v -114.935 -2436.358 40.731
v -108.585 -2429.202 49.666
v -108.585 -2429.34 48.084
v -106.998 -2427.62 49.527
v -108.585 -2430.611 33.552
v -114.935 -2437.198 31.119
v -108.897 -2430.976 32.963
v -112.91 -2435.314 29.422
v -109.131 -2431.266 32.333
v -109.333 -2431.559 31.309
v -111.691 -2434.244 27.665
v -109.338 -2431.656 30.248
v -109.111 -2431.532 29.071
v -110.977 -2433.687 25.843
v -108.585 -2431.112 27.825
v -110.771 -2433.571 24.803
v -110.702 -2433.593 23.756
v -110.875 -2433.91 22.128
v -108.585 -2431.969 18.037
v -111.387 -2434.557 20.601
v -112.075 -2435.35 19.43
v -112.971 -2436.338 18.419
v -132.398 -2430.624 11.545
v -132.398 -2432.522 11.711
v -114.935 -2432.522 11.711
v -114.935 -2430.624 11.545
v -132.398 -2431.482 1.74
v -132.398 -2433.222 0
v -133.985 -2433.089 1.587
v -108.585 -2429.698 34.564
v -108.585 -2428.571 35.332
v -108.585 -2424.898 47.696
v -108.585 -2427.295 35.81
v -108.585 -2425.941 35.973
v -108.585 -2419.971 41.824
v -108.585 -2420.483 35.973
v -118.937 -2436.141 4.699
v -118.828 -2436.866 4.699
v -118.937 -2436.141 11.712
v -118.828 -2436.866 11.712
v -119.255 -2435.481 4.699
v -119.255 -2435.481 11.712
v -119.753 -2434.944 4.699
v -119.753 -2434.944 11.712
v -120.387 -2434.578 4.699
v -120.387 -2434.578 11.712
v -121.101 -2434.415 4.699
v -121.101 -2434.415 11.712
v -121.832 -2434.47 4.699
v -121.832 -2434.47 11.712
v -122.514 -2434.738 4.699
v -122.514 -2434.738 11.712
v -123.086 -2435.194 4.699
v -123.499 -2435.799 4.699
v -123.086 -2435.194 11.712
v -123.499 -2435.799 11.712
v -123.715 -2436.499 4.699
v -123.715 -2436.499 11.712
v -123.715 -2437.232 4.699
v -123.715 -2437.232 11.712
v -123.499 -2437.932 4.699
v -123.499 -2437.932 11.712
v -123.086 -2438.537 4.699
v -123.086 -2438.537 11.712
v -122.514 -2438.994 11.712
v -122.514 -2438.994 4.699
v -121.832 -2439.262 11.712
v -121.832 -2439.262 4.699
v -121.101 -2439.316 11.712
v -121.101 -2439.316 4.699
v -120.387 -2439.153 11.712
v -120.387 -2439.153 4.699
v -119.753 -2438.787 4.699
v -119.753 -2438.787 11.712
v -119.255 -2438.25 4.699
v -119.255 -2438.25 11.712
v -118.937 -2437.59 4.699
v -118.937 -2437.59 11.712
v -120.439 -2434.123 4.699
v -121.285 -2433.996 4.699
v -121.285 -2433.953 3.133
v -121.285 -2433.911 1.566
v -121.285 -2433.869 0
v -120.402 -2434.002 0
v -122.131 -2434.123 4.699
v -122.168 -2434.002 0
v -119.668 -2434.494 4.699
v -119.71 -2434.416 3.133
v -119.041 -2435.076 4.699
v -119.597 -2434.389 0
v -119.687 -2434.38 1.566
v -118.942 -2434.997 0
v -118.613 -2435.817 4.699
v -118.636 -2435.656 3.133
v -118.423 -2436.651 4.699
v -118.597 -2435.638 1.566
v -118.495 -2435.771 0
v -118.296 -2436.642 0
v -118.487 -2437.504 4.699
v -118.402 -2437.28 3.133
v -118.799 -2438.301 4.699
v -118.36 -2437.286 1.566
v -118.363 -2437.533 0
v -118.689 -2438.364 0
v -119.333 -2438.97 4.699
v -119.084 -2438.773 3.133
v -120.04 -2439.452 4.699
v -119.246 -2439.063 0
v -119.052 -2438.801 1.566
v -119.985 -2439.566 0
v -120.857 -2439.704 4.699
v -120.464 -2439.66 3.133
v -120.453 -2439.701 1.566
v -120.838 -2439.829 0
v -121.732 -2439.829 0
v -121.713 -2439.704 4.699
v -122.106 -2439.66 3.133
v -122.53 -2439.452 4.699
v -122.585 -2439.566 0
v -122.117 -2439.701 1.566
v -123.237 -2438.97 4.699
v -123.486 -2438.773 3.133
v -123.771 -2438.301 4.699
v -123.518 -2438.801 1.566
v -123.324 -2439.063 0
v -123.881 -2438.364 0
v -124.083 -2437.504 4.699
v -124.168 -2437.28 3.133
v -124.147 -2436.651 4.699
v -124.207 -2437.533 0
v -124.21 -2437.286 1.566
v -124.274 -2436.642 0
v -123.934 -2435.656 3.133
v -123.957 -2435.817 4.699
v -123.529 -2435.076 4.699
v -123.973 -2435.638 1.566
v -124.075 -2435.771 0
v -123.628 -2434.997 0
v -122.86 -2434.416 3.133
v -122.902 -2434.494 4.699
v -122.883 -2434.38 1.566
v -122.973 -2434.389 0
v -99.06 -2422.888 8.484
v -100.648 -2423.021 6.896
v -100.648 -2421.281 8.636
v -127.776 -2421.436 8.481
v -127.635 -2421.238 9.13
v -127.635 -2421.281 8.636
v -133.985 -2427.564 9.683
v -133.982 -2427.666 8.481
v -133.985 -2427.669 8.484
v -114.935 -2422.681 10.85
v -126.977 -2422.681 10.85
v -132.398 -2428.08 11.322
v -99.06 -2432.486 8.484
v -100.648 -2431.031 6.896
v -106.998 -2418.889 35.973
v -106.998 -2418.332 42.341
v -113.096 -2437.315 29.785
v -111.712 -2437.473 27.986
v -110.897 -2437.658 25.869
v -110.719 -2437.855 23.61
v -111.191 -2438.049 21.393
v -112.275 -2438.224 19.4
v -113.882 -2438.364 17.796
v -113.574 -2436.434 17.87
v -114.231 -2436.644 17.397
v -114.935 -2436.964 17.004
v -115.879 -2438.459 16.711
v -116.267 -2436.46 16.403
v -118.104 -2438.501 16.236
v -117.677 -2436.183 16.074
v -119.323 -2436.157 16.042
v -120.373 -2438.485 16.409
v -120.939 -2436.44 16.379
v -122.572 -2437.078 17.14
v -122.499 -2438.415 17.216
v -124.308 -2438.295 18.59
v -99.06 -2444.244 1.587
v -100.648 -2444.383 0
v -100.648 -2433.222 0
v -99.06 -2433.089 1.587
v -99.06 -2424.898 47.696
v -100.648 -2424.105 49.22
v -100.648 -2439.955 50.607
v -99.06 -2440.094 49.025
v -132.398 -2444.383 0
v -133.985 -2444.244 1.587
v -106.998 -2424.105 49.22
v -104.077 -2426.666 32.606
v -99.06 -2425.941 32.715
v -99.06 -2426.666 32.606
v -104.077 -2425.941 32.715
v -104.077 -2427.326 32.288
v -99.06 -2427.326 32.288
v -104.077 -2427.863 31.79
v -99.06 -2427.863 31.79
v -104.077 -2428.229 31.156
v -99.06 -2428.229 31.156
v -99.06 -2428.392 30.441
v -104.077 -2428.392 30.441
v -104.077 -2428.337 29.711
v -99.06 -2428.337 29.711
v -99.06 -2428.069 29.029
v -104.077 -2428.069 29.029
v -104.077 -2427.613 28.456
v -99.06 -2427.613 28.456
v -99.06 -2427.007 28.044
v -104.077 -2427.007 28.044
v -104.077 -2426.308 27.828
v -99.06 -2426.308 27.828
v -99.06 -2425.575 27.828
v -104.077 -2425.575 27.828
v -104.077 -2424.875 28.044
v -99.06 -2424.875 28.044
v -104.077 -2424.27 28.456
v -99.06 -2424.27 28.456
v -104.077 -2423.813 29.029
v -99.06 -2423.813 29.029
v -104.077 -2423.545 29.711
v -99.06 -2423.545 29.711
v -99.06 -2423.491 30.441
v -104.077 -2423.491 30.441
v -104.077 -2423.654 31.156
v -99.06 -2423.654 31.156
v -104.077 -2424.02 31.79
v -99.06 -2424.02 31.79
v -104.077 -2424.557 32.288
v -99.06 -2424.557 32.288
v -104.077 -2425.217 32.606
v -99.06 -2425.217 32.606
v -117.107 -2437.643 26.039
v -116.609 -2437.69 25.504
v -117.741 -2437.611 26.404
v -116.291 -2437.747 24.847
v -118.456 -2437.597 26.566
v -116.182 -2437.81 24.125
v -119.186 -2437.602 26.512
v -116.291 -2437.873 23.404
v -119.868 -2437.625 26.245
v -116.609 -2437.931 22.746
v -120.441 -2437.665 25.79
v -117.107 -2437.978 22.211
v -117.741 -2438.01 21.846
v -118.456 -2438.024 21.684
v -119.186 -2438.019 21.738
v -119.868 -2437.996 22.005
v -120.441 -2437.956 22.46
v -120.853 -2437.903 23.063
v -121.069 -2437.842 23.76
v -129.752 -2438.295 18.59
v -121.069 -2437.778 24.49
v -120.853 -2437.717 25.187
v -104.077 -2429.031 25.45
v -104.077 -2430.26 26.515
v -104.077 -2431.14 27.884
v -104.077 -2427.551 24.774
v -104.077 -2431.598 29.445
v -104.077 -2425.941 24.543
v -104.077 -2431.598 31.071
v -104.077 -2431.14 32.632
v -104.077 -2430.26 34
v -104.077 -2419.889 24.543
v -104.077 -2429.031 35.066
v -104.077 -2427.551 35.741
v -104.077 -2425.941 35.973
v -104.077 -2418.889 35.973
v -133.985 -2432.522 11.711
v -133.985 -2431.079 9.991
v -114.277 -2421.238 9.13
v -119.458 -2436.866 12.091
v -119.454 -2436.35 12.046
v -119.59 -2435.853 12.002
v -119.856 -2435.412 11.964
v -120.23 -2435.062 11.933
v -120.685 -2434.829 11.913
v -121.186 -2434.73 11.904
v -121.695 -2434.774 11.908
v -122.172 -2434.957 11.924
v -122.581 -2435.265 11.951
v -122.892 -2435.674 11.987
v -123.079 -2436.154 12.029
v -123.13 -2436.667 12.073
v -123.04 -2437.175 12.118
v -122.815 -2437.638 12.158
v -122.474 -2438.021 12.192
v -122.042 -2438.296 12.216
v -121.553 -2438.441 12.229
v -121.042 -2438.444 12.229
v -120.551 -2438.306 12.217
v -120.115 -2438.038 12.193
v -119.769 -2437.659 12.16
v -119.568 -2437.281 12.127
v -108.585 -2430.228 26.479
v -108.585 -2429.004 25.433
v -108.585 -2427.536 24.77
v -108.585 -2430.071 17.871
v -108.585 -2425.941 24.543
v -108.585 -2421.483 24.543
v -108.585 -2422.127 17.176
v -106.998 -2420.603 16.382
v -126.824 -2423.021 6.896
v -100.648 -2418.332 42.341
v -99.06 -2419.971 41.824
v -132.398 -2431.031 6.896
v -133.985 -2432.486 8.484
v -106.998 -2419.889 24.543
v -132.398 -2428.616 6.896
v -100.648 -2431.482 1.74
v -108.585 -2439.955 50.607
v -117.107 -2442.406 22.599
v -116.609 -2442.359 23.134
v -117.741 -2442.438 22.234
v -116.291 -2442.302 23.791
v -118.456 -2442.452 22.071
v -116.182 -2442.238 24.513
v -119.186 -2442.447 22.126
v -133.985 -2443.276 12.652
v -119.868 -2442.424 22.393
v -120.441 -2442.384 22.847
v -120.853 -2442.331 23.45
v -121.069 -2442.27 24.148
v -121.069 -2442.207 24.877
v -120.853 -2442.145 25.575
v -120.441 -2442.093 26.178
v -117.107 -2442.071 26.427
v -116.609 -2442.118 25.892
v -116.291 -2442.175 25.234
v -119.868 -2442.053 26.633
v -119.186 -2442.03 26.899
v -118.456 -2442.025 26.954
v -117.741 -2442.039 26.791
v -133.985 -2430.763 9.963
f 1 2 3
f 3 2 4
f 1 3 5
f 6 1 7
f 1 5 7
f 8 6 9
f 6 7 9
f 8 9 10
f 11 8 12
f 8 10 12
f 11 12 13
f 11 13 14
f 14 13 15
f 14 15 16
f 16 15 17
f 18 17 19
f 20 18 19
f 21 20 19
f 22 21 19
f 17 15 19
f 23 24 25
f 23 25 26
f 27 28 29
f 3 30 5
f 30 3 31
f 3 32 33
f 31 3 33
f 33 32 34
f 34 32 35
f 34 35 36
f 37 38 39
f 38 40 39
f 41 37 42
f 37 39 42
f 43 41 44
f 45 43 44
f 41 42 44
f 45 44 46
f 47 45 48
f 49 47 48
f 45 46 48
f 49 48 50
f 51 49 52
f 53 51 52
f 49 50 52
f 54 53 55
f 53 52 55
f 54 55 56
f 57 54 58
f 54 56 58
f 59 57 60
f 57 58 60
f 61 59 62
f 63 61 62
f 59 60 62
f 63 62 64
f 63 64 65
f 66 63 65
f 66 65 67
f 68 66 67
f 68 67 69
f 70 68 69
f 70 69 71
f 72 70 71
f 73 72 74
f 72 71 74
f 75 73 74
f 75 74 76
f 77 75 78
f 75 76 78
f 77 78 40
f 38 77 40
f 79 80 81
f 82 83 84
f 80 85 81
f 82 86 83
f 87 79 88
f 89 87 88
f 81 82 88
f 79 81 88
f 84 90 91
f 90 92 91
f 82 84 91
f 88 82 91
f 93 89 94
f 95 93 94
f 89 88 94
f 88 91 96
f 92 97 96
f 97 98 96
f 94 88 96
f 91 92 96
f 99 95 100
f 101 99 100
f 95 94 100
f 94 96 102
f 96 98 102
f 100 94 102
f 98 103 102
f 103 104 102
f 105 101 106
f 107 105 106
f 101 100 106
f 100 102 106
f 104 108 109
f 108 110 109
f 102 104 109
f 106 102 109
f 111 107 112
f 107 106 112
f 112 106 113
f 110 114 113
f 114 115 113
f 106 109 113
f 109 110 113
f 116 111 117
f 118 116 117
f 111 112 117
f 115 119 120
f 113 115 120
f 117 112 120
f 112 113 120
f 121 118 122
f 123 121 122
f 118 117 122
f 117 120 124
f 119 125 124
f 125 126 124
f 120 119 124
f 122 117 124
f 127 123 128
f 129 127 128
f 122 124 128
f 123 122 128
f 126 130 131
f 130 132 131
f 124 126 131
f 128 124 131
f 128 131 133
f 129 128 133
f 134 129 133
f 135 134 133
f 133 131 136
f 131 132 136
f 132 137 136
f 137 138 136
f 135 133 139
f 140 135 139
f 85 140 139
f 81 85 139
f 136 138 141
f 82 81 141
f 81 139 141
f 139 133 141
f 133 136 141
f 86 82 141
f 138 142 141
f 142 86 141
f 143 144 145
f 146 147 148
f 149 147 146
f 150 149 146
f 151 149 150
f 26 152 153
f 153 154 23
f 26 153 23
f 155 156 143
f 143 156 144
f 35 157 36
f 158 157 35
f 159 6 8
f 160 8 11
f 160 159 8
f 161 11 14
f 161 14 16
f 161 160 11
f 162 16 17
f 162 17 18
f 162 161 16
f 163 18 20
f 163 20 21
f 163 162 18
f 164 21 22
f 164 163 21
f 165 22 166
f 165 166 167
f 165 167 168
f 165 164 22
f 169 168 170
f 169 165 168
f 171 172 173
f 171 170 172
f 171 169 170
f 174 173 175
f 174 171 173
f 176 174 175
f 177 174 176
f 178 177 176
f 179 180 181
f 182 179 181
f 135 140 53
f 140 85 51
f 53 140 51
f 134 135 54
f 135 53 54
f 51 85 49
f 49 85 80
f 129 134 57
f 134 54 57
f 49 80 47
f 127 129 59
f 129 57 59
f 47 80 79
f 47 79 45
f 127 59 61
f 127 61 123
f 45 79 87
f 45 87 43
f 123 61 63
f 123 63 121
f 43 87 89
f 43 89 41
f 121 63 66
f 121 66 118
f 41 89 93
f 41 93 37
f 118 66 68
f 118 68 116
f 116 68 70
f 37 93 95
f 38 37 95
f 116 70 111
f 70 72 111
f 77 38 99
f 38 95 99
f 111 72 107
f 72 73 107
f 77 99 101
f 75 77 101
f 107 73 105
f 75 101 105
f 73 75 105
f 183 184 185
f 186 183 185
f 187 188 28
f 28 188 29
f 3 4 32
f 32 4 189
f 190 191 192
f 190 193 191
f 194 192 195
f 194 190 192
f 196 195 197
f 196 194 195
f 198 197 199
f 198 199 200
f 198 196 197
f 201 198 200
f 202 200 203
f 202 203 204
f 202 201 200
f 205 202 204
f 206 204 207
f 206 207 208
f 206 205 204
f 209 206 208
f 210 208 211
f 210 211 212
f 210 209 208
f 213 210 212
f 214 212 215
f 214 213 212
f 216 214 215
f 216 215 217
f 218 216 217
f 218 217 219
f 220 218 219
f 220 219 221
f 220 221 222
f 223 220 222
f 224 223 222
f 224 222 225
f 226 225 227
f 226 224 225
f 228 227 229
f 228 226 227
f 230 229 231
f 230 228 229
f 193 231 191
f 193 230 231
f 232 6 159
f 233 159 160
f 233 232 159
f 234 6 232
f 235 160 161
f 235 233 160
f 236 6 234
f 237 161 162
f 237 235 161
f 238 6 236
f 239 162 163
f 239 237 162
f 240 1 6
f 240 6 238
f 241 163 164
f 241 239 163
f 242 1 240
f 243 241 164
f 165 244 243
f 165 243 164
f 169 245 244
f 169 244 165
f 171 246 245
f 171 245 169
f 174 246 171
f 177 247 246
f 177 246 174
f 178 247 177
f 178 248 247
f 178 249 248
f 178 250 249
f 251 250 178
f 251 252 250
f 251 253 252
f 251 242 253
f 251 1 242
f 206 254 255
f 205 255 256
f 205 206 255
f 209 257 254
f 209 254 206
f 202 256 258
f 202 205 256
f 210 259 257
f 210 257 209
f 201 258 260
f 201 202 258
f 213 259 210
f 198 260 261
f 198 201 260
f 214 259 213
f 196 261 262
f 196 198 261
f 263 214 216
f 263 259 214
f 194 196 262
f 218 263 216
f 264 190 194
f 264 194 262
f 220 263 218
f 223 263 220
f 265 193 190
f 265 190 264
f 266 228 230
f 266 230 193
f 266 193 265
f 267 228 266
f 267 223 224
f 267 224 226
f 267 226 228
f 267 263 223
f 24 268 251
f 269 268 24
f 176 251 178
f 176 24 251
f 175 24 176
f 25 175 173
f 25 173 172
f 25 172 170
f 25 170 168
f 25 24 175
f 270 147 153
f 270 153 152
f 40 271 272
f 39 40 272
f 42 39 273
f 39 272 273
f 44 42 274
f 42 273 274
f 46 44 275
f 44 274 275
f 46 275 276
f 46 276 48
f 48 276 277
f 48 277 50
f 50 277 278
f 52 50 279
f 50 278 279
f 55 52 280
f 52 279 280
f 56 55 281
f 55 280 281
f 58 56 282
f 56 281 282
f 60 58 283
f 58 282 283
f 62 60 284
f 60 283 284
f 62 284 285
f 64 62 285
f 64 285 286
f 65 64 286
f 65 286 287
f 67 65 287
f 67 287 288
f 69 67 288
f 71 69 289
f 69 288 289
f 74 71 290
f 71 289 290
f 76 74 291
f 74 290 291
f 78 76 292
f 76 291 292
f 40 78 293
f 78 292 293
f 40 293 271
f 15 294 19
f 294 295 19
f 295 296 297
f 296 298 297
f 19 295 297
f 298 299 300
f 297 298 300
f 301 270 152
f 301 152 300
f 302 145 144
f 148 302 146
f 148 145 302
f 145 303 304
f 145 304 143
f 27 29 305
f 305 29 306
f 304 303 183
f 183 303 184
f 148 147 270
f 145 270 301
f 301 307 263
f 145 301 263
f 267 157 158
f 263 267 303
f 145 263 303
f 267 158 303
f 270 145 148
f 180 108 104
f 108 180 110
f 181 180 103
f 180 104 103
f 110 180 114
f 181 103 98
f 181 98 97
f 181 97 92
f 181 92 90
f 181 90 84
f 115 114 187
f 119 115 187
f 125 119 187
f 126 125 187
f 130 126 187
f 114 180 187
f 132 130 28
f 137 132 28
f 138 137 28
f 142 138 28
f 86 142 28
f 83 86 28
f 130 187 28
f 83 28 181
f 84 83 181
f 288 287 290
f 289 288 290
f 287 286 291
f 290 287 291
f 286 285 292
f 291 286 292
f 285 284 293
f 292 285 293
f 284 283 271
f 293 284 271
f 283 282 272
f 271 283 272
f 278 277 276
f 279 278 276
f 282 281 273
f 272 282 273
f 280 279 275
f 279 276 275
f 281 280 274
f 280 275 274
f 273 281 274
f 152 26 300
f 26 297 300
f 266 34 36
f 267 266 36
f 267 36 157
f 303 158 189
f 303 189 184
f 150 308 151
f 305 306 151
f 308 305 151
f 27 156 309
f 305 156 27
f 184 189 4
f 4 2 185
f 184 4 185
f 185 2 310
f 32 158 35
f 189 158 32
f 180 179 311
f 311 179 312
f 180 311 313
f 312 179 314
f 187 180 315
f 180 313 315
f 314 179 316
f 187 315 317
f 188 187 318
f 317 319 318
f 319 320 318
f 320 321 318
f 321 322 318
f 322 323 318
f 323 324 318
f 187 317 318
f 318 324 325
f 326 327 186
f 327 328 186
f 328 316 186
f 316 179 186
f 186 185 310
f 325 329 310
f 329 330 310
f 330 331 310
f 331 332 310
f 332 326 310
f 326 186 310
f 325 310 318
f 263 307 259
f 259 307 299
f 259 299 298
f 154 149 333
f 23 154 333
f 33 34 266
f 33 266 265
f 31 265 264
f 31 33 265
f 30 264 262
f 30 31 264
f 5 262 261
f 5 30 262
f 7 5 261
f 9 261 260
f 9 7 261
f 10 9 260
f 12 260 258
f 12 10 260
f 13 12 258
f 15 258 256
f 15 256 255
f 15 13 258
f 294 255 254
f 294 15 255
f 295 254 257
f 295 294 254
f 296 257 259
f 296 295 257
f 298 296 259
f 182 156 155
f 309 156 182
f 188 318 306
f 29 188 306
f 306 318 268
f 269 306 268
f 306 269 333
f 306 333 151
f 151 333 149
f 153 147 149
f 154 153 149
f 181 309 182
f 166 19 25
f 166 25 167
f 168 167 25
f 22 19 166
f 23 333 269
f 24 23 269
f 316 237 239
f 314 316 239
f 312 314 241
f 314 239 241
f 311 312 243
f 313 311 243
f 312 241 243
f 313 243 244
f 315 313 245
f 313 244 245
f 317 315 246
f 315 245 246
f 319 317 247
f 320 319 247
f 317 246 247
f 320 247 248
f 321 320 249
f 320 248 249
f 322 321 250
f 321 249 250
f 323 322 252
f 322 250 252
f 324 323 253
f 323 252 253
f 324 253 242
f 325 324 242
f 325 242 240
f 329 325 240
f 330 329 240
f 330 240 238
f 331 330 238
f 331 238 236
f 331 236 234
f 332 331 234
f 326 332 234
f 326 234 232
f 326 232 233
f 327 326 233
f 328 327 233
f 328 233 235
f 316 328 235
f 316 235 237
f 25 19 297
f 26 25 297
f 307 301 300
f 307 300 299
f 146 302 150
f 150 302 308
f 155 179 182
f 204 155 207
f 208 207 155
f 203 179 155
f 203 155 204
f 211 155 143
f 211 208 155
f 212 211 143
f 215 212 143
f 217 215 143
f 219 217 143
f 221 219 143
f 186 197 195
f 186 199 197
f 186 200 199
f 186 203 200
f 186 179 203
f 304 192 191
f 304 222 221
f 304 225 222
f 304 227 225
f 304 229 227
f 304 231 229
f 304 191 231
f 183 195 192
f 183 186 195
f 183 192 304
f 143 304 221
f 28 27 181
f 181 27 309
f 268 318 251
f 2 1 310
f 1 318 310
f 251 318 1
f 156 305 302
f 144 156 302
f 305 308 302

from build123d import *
from OCP.BRepFilletAPI import BRepFilletAPI_MakeChamfer

# Parameters (mm, degrees)
BOSS_EXTRUDE3_DEPTH             = 12.7
CUT_EXTRUDE1_DEPTH              = 2446.156245266122
CUT_EXTRUDE2_DEPTH              = 25.4
BOSS_EXTRUDE4_DEPTH             = 9.525
BOSS_EXTRUDE5_START             = -133.985000001
BOSS_EXTRUDE5_DEPTH             = 34.925
CUT_EXTRUDE3_REACH              = 2445.46
SKETCH12_W                      = 34.925000000000026
SKETCH12_H                      = 0.3325309889783057
CHAMFER4_SIZE                   = 6.35
CHAMFER5_SIZE                   = 1.5875
CHAMFER5_SIZE2                  = 1.7463498023569755
CHAMFER5_SIZE2_2                = 1.7463498023569135
CHAMFER5_SIZE2_3                = 1.695194438361193
CUT_EXTRUDE5_START              = 10.8585
CUT_EXTRUDE5_DEPTH              = 10.8585
F_8_START                       = -200.342016287
F_8_CLEARANCE_HOLE1_2_OUTLINE_W = 7
F_8_CLEARANCE_HOLE1_2_OUTLINE_H = 7
F_8_CLEARANCE_HOLE1_2_DEPTH     = 0.279842574
F_8_CLEARANCE_HOLE2_D           = 4.9149
CUT_EXTRUDE6_REACH              = 253.711
SKETCH24_R                      = 7.937499999999993


with BuildPart() as part:
    # Sketch6 → Boss-Extrude3 (new body)
    with BuildSketch(Plane(origin=(2.311843e-11, -2425.8151689885194, 212.23132709558422), x_dir=(1, 9.46e-15, -8.3e-16), z_dir=(9.493905125025943e-15, -0.9961946980917503, 0.08715574274760324))):
        Polygon((-99.0600000006817, -213.04201628669756), (-133.9850000006817, -213.04201628669756), (-133.9850000006817, -200.34201628669757), (-108.5850000006817, -162.24201628669755), (-99.0600000006817, -162.24201628669755), align=None)
    extrude(amount=-BOSS_EXTRUDE3_DEPTH)

    # Sketch7 → Cut-Extrude1 (cut, through all)
    with BuildSketch(Plane.ZY.offset(133.9850000006817)):
        Polygon((-2.4964e-13, -2444.383004154433), (0, -2431.6344922176327), (-1.1068779328950917, -2431.7313314886683), align=None)
    extrude(amount=-CUT_EXTRUDE1_DEPTH, mode=Mode.SUBTRACT)

    # Sketch8 → Cut-Extrude2 (cut)
    with BuildSketch(Plane.ZY.offset(133.9850000006817)):
        Polygon((50.219283386547545, -2435.5274069898373), (12.26426538925185, -2438.848040788521), (11.544794732870468, -2430.6244535557735), (49.49981273016616, -2427.30381975709), align=None)
    extrude(amount=-CUT_EXTRUDE2_DEPTH, mode=Mode.SUBTRACT)

    # Sketch10 → Boss-Extrude4 (add, through all)
    with BuildSketch(Plane.ZY.offset(108.58500000067501)):
        Polygon((49.499812730166134, -2427.3038197570895), (11.544794732870441, -2430.624453555773), (10.711465212786628, -2421.099453555773), (48.66648321008233, -2417.7788197570894), align=None)
    extrude(amount=-BOSS_EXTRUDE4_DEPTH)

    # Boss-Extrude5: read off the stored shape, not the designer's step
    # Boss-Extrude5 outline → Boss-Extrude5 (add)
    with BuildSketch(Plane.YZ.offset(BOSS_EXTRUDE5_START)):
        Polygon((-2420.768187948, 10.682483227), (-2430.624453556, 11.544794733), (-2431.031161645, 6.8961), (-2421.099453556, 6.8961), align=None)
    extrude(amount=BOSS_EXTRUDE5_DEPTH)

    # Sketch12 → Cut-Extrude3 (cut, up to next)
    with BuildSketch(Plane(origin=(0, -17.46095723301537, -199.5796544297948), x_dir=(1, 0, 0), z_dir=(0, 0.0871557427475931, 0.9961946980917512)), mode=Mode.PRIVATE) as cut_extrude3_sk1:
        with Locations((-116.52250000065857, -2412.653739397144)):
            Rectangle(SKETCH12_W, SKETCH12_H)
    cut_extrude3_tool1 = extrude(cut_extrude3_sk1.sketch, amount=-CUT_EXTRUDE3_REACH, mode=Mode.PRIVATE) & part.part
    add(cut_extrude3_tool1.solids().sort_by_distance((-116.5225, -2420.933821, 10.696974))[0], mode=Mode.SUBTRACT)

    # Chamfer4
    chamfer4_edges = [part.edges().sort_by_distance(p)[0] for p in [
        (-108.58500000065862, -2437.1877238891802, 31.241774387899785),
        (-108.58500000065875, -2425.8619535557737, 11.1281299728286),
        (-121.28500000065863, -2438.848040788522, 12.26426538925195),
        (-103.82250000065878, -2417.7788197570903, 48.6664832100824),
        (-133.98500000065857, -2421.266354157439, 8.803782606393371),
    ]]
    chamfer(chamfer4_edges, length=CHAMFER4_SIZE)

    # Chamfer5: one chamfer whose edges measure the first distance from different faces: ONE call of the kernel's chamfer builder (chamfer() names one face for all edges)
    chamfer5_edges_1 = [part.edges().sort_by_distance(p)[0] for p in [
        (-111.76000000038354, -2420.822734072567, 13.874383379035507),
        (-99.0600000006587, -2431.3328269313633, 3.4480500000041445),
        (-99.06000000065865, -2438.0087481860337, -4.5e-14),
        (-133.98500000065866, -2438.008748186034, -1.396e-14),
        (-133.98500000065872, -2431.332826931364, 3.448050000004116),
        (-133.985000001, -2429.419336186252, 6.8961),
        (-99.060000001, -2426.232208202052, 6.8961),
        (-108.58500000065878, -2419.43913665644, 29.688974211344913),
        (-99.06000000075693, -2419.8827567413205, 24.618373438599672),
        (-121.28500000051437, -2421.099453555774, 10.711465212786711),
        (-133.985000001, -2429.024871722332, 11.404849456074741),
        (-130.81000000070145, -2424.262371722282, 10.988184695738429),
        (-99.06000000065865, -2432.030074256415, 49.91330641979526),
        (-108.5850000006587, -2426.6531133734643, 49.44288329831503),
        (-108.58500000065877, -2421.218457406756, 45.780284526864456),
        (-99.06000000065876, -2421.2184574067555, 45.78028452686439),
    ]]
    chamfer5_edges_2 = [part.edges().sort_by_distance(p)[0] for p in [
        (-116.52250000065871, -2431.634492217634, 9.642e-14),
    ]]
    chamfer5_side_2 = [part.faces().sort_by_distance(p)[0] for p in [
        (-116.52250000065865, -2438.008748186034, -2.841e-14),
    ]]
    chamfer5_edges_3 = [part.edges().sort_by_distance(p)[0] for p in [
        (-113.34750000082943, -2421.433254759104, 6.896099999999999),
    ]]
    chamfer5_side_3 = [part.faces().sort_by_distance(p)[0] for p in [
        (-115.53645576803177, -2426.404038617734, 6.8961),
    ]]
    chamfer5_edges_4 = [part.edges().sort_by_distance(p)[0] for p in [
        (-130.81000000070134, -2424.6203827433465, 6.8961),
    ]]
    chamfer5_side_4 = [part.faces().sort_by_distance(p)[0] for p in [
        (-130.8815677895093, -2424.512945541763, 8.945261119766531),
    ]]
    chamfer5 = BRepFilletAPI_MakeChamfer(part.part.solid().wrapped)
    for e in chamfer5_edges_1:
        chamfer5.Add(CHAMFER5_SIZE, e.wrapped)
    for e in chamfer5_edges_2:
        chamfer5.Add(CHAMFER5_SIZE, CHAMFER5_SIZE2, e.wrapped, chamfer5_side_2[0].wrapped)  # the first distance lies on this face
    for e in chamfer5_edges_3:
        chamfer5.Add(CHAMFER5_SIZE, CHAMFER5_SIZE2_2, e.wrapped, chamfer5_side_3[0].wrapped)  # the first distance lies on this face
    for e in chamfer5_edges_4:
        chamfer5.Add(CHAMFER5_SIZE, CHAMFER5_SIZE2_3, e.wrapped, chamfer5_side_4[0].wrapped)  # the first distance lies on this face
    add(Compound.cast(chamfer5.Shape()), mode=Mode.REPLACE)

    # Sketch14 → CBORE for #8 Pan Head Machine Screw1 (revolve, cut)
    with BuildSketch(Plane(origin=(-108.58500000065874, -2425.9412416479745, 30.25783468724938), x_dir=(5.9e-16, 0, 1), z_dir=(-6.7e-15, 1, 0))):
        Polygon((0, 0), (-2.33e-15, 9.525000000000226), (2.4574499999999975, 9.525000000000226), (2.4574499999999997, 4.508499999999999), (5.715, 4.508499999999999), (5.715, 0), align=None)
    revolve(axis=Axis((-114.93500000065873, -2425.9412416479745, 30.257834687249385), (1, 7.96e-15, -5.9e-16)), mode=Mode.SUBTRACT)

    # Sketch16 → Cut-Extrude5 (cut)
    with BuildSketch(Plane.ZY.offset(104.07650000065875).offset(CUT_EXTRUDE5_START)):
        with BuildLine():
            Line((35.972834687249275, -2425.9412416479745), (35.972834687249254, -2417.8454644621274))
            Line((35.972834687249254, -2417.8454644621274), (24.542834687249364, -2418.845459886228))
            Line((24.542834687249364, -2418.845459886228), (24.542834687249364, -2425.9412416479745))
            ThreePointArc((24.542834687249364, -2425.9412416479745), (30.257834687249318, -2431.6562416479746), (35.972834687249275, -2425.9412416479745))
        make_face()
    extrude(amount=-CUT_EXTRUDE5_DEPTH, mode=Mode.SUBTRACT)

    # Sketch18 → Hole1 (revolve, cut)
    with BuildSketch(Plane(origin=(-121.28500000067221, -2436.8657251652107, -4.765035e-11), x_dir=(0, 1, 1.96e-14), z_dir=(1, 0, -8.3e-16))):
        Polygon((0, 0), (0, 4.6989999999999945), (2.870200000000013, 4.6989999999999945), (2.9972000000000123, 0), align=None)
    revolve(axis=Axis((-121.28500000067213, -2436.865725165213, 109.99999999995235), (-8.3e-16, 1.895e-14, -1)), mode=Mode.SUBTRACT)

    # #8 Clearance Hole1: read off the stored shape, not the designer's step
    # #8 Clearance Hole1 outline → #8 Clearance Hole1 (revolve, cut)
    with BuildSketch(Plane(origin=(-121.285000001, -2436.865725165, 0), x_dir=(1, 0, 0), z_dir=(0, -1, 0))):
        Polygon((2.45745, 4.699), (2.45745, 11.711826423), (1.590785336, 12.232571089), (0, 12.232571089), (0, 4.699), align=None)
    revolve(axis=Axis((-121.285000001, -2436.865725165, 0), (0, 0, 1)), mode=Mode.SUBTRACT)

    # 8 Clearance Hole1 2 outline → 8 Clearance Hole1 2 (add)
    with BuildSketch(Plane(origin=(0, 0, 0), x_dir=(1, 0, 0), z_dir=(0, 0.08715574274759312, 0.9961946980917512)).offset(F_8_START)):
        with Locations((-121.50000000000001, -2428.5)):
            Rectangle(F_8_CLEARANCE_HOLE1_2_OUTLINE_W, F_8_CLEARANCE_HOLE1_2_OUTLINE_H)
    extrude(amount=F_8_CLEARANCE_HOLE1_2_DEPTH)

    # #8 Clearance Hole2 (through all)
    with Locations(Plane(origin=(3.101414e-11, -2425.8151689885194, 212.23132709558124), x_dir=(-1, -1.269e-14, 1.11e-15), z_dir=(1.2736388665441791e-14, -0.9961946980917505, 0.08715574274760202))):
        with Locations((118.639166667, 188.435766287)):
            Hole(F_8_CLEARANCE_HOLE2_D / 2)

    # Sketch24 → Cut-Extrude6 (cut, up to next)
    with BuildSketch(Plane(origin=(2.307623e-11, -2421.3870835555053, 211.84391981904722), x_dir=(1, 9.46e-15, -8.3e-16), z_dir=(-9.493905125025941e-15, 0.9961946980917512, -0.08715574274759331)), mode=Mode.PRIVATE) as cut_extrude6_sk1:
        with Locations((-118.6391666673483, 188.43576628667344)):
            Circle(SKETCH24_R)
    cut_extrude6_tool1 = extrude(cut_extrude6_sk1.sketch, amount=CUT_EXTRUDE6_REACH, mode=Mode.PRIVATE) & part.part
    add(cut_extrude6_tool1.solids().sort_by_distance((-118.639167, -2437.810343, 24.125209))[0], mode=Mode.SUBTRACT)


solid = part.part
